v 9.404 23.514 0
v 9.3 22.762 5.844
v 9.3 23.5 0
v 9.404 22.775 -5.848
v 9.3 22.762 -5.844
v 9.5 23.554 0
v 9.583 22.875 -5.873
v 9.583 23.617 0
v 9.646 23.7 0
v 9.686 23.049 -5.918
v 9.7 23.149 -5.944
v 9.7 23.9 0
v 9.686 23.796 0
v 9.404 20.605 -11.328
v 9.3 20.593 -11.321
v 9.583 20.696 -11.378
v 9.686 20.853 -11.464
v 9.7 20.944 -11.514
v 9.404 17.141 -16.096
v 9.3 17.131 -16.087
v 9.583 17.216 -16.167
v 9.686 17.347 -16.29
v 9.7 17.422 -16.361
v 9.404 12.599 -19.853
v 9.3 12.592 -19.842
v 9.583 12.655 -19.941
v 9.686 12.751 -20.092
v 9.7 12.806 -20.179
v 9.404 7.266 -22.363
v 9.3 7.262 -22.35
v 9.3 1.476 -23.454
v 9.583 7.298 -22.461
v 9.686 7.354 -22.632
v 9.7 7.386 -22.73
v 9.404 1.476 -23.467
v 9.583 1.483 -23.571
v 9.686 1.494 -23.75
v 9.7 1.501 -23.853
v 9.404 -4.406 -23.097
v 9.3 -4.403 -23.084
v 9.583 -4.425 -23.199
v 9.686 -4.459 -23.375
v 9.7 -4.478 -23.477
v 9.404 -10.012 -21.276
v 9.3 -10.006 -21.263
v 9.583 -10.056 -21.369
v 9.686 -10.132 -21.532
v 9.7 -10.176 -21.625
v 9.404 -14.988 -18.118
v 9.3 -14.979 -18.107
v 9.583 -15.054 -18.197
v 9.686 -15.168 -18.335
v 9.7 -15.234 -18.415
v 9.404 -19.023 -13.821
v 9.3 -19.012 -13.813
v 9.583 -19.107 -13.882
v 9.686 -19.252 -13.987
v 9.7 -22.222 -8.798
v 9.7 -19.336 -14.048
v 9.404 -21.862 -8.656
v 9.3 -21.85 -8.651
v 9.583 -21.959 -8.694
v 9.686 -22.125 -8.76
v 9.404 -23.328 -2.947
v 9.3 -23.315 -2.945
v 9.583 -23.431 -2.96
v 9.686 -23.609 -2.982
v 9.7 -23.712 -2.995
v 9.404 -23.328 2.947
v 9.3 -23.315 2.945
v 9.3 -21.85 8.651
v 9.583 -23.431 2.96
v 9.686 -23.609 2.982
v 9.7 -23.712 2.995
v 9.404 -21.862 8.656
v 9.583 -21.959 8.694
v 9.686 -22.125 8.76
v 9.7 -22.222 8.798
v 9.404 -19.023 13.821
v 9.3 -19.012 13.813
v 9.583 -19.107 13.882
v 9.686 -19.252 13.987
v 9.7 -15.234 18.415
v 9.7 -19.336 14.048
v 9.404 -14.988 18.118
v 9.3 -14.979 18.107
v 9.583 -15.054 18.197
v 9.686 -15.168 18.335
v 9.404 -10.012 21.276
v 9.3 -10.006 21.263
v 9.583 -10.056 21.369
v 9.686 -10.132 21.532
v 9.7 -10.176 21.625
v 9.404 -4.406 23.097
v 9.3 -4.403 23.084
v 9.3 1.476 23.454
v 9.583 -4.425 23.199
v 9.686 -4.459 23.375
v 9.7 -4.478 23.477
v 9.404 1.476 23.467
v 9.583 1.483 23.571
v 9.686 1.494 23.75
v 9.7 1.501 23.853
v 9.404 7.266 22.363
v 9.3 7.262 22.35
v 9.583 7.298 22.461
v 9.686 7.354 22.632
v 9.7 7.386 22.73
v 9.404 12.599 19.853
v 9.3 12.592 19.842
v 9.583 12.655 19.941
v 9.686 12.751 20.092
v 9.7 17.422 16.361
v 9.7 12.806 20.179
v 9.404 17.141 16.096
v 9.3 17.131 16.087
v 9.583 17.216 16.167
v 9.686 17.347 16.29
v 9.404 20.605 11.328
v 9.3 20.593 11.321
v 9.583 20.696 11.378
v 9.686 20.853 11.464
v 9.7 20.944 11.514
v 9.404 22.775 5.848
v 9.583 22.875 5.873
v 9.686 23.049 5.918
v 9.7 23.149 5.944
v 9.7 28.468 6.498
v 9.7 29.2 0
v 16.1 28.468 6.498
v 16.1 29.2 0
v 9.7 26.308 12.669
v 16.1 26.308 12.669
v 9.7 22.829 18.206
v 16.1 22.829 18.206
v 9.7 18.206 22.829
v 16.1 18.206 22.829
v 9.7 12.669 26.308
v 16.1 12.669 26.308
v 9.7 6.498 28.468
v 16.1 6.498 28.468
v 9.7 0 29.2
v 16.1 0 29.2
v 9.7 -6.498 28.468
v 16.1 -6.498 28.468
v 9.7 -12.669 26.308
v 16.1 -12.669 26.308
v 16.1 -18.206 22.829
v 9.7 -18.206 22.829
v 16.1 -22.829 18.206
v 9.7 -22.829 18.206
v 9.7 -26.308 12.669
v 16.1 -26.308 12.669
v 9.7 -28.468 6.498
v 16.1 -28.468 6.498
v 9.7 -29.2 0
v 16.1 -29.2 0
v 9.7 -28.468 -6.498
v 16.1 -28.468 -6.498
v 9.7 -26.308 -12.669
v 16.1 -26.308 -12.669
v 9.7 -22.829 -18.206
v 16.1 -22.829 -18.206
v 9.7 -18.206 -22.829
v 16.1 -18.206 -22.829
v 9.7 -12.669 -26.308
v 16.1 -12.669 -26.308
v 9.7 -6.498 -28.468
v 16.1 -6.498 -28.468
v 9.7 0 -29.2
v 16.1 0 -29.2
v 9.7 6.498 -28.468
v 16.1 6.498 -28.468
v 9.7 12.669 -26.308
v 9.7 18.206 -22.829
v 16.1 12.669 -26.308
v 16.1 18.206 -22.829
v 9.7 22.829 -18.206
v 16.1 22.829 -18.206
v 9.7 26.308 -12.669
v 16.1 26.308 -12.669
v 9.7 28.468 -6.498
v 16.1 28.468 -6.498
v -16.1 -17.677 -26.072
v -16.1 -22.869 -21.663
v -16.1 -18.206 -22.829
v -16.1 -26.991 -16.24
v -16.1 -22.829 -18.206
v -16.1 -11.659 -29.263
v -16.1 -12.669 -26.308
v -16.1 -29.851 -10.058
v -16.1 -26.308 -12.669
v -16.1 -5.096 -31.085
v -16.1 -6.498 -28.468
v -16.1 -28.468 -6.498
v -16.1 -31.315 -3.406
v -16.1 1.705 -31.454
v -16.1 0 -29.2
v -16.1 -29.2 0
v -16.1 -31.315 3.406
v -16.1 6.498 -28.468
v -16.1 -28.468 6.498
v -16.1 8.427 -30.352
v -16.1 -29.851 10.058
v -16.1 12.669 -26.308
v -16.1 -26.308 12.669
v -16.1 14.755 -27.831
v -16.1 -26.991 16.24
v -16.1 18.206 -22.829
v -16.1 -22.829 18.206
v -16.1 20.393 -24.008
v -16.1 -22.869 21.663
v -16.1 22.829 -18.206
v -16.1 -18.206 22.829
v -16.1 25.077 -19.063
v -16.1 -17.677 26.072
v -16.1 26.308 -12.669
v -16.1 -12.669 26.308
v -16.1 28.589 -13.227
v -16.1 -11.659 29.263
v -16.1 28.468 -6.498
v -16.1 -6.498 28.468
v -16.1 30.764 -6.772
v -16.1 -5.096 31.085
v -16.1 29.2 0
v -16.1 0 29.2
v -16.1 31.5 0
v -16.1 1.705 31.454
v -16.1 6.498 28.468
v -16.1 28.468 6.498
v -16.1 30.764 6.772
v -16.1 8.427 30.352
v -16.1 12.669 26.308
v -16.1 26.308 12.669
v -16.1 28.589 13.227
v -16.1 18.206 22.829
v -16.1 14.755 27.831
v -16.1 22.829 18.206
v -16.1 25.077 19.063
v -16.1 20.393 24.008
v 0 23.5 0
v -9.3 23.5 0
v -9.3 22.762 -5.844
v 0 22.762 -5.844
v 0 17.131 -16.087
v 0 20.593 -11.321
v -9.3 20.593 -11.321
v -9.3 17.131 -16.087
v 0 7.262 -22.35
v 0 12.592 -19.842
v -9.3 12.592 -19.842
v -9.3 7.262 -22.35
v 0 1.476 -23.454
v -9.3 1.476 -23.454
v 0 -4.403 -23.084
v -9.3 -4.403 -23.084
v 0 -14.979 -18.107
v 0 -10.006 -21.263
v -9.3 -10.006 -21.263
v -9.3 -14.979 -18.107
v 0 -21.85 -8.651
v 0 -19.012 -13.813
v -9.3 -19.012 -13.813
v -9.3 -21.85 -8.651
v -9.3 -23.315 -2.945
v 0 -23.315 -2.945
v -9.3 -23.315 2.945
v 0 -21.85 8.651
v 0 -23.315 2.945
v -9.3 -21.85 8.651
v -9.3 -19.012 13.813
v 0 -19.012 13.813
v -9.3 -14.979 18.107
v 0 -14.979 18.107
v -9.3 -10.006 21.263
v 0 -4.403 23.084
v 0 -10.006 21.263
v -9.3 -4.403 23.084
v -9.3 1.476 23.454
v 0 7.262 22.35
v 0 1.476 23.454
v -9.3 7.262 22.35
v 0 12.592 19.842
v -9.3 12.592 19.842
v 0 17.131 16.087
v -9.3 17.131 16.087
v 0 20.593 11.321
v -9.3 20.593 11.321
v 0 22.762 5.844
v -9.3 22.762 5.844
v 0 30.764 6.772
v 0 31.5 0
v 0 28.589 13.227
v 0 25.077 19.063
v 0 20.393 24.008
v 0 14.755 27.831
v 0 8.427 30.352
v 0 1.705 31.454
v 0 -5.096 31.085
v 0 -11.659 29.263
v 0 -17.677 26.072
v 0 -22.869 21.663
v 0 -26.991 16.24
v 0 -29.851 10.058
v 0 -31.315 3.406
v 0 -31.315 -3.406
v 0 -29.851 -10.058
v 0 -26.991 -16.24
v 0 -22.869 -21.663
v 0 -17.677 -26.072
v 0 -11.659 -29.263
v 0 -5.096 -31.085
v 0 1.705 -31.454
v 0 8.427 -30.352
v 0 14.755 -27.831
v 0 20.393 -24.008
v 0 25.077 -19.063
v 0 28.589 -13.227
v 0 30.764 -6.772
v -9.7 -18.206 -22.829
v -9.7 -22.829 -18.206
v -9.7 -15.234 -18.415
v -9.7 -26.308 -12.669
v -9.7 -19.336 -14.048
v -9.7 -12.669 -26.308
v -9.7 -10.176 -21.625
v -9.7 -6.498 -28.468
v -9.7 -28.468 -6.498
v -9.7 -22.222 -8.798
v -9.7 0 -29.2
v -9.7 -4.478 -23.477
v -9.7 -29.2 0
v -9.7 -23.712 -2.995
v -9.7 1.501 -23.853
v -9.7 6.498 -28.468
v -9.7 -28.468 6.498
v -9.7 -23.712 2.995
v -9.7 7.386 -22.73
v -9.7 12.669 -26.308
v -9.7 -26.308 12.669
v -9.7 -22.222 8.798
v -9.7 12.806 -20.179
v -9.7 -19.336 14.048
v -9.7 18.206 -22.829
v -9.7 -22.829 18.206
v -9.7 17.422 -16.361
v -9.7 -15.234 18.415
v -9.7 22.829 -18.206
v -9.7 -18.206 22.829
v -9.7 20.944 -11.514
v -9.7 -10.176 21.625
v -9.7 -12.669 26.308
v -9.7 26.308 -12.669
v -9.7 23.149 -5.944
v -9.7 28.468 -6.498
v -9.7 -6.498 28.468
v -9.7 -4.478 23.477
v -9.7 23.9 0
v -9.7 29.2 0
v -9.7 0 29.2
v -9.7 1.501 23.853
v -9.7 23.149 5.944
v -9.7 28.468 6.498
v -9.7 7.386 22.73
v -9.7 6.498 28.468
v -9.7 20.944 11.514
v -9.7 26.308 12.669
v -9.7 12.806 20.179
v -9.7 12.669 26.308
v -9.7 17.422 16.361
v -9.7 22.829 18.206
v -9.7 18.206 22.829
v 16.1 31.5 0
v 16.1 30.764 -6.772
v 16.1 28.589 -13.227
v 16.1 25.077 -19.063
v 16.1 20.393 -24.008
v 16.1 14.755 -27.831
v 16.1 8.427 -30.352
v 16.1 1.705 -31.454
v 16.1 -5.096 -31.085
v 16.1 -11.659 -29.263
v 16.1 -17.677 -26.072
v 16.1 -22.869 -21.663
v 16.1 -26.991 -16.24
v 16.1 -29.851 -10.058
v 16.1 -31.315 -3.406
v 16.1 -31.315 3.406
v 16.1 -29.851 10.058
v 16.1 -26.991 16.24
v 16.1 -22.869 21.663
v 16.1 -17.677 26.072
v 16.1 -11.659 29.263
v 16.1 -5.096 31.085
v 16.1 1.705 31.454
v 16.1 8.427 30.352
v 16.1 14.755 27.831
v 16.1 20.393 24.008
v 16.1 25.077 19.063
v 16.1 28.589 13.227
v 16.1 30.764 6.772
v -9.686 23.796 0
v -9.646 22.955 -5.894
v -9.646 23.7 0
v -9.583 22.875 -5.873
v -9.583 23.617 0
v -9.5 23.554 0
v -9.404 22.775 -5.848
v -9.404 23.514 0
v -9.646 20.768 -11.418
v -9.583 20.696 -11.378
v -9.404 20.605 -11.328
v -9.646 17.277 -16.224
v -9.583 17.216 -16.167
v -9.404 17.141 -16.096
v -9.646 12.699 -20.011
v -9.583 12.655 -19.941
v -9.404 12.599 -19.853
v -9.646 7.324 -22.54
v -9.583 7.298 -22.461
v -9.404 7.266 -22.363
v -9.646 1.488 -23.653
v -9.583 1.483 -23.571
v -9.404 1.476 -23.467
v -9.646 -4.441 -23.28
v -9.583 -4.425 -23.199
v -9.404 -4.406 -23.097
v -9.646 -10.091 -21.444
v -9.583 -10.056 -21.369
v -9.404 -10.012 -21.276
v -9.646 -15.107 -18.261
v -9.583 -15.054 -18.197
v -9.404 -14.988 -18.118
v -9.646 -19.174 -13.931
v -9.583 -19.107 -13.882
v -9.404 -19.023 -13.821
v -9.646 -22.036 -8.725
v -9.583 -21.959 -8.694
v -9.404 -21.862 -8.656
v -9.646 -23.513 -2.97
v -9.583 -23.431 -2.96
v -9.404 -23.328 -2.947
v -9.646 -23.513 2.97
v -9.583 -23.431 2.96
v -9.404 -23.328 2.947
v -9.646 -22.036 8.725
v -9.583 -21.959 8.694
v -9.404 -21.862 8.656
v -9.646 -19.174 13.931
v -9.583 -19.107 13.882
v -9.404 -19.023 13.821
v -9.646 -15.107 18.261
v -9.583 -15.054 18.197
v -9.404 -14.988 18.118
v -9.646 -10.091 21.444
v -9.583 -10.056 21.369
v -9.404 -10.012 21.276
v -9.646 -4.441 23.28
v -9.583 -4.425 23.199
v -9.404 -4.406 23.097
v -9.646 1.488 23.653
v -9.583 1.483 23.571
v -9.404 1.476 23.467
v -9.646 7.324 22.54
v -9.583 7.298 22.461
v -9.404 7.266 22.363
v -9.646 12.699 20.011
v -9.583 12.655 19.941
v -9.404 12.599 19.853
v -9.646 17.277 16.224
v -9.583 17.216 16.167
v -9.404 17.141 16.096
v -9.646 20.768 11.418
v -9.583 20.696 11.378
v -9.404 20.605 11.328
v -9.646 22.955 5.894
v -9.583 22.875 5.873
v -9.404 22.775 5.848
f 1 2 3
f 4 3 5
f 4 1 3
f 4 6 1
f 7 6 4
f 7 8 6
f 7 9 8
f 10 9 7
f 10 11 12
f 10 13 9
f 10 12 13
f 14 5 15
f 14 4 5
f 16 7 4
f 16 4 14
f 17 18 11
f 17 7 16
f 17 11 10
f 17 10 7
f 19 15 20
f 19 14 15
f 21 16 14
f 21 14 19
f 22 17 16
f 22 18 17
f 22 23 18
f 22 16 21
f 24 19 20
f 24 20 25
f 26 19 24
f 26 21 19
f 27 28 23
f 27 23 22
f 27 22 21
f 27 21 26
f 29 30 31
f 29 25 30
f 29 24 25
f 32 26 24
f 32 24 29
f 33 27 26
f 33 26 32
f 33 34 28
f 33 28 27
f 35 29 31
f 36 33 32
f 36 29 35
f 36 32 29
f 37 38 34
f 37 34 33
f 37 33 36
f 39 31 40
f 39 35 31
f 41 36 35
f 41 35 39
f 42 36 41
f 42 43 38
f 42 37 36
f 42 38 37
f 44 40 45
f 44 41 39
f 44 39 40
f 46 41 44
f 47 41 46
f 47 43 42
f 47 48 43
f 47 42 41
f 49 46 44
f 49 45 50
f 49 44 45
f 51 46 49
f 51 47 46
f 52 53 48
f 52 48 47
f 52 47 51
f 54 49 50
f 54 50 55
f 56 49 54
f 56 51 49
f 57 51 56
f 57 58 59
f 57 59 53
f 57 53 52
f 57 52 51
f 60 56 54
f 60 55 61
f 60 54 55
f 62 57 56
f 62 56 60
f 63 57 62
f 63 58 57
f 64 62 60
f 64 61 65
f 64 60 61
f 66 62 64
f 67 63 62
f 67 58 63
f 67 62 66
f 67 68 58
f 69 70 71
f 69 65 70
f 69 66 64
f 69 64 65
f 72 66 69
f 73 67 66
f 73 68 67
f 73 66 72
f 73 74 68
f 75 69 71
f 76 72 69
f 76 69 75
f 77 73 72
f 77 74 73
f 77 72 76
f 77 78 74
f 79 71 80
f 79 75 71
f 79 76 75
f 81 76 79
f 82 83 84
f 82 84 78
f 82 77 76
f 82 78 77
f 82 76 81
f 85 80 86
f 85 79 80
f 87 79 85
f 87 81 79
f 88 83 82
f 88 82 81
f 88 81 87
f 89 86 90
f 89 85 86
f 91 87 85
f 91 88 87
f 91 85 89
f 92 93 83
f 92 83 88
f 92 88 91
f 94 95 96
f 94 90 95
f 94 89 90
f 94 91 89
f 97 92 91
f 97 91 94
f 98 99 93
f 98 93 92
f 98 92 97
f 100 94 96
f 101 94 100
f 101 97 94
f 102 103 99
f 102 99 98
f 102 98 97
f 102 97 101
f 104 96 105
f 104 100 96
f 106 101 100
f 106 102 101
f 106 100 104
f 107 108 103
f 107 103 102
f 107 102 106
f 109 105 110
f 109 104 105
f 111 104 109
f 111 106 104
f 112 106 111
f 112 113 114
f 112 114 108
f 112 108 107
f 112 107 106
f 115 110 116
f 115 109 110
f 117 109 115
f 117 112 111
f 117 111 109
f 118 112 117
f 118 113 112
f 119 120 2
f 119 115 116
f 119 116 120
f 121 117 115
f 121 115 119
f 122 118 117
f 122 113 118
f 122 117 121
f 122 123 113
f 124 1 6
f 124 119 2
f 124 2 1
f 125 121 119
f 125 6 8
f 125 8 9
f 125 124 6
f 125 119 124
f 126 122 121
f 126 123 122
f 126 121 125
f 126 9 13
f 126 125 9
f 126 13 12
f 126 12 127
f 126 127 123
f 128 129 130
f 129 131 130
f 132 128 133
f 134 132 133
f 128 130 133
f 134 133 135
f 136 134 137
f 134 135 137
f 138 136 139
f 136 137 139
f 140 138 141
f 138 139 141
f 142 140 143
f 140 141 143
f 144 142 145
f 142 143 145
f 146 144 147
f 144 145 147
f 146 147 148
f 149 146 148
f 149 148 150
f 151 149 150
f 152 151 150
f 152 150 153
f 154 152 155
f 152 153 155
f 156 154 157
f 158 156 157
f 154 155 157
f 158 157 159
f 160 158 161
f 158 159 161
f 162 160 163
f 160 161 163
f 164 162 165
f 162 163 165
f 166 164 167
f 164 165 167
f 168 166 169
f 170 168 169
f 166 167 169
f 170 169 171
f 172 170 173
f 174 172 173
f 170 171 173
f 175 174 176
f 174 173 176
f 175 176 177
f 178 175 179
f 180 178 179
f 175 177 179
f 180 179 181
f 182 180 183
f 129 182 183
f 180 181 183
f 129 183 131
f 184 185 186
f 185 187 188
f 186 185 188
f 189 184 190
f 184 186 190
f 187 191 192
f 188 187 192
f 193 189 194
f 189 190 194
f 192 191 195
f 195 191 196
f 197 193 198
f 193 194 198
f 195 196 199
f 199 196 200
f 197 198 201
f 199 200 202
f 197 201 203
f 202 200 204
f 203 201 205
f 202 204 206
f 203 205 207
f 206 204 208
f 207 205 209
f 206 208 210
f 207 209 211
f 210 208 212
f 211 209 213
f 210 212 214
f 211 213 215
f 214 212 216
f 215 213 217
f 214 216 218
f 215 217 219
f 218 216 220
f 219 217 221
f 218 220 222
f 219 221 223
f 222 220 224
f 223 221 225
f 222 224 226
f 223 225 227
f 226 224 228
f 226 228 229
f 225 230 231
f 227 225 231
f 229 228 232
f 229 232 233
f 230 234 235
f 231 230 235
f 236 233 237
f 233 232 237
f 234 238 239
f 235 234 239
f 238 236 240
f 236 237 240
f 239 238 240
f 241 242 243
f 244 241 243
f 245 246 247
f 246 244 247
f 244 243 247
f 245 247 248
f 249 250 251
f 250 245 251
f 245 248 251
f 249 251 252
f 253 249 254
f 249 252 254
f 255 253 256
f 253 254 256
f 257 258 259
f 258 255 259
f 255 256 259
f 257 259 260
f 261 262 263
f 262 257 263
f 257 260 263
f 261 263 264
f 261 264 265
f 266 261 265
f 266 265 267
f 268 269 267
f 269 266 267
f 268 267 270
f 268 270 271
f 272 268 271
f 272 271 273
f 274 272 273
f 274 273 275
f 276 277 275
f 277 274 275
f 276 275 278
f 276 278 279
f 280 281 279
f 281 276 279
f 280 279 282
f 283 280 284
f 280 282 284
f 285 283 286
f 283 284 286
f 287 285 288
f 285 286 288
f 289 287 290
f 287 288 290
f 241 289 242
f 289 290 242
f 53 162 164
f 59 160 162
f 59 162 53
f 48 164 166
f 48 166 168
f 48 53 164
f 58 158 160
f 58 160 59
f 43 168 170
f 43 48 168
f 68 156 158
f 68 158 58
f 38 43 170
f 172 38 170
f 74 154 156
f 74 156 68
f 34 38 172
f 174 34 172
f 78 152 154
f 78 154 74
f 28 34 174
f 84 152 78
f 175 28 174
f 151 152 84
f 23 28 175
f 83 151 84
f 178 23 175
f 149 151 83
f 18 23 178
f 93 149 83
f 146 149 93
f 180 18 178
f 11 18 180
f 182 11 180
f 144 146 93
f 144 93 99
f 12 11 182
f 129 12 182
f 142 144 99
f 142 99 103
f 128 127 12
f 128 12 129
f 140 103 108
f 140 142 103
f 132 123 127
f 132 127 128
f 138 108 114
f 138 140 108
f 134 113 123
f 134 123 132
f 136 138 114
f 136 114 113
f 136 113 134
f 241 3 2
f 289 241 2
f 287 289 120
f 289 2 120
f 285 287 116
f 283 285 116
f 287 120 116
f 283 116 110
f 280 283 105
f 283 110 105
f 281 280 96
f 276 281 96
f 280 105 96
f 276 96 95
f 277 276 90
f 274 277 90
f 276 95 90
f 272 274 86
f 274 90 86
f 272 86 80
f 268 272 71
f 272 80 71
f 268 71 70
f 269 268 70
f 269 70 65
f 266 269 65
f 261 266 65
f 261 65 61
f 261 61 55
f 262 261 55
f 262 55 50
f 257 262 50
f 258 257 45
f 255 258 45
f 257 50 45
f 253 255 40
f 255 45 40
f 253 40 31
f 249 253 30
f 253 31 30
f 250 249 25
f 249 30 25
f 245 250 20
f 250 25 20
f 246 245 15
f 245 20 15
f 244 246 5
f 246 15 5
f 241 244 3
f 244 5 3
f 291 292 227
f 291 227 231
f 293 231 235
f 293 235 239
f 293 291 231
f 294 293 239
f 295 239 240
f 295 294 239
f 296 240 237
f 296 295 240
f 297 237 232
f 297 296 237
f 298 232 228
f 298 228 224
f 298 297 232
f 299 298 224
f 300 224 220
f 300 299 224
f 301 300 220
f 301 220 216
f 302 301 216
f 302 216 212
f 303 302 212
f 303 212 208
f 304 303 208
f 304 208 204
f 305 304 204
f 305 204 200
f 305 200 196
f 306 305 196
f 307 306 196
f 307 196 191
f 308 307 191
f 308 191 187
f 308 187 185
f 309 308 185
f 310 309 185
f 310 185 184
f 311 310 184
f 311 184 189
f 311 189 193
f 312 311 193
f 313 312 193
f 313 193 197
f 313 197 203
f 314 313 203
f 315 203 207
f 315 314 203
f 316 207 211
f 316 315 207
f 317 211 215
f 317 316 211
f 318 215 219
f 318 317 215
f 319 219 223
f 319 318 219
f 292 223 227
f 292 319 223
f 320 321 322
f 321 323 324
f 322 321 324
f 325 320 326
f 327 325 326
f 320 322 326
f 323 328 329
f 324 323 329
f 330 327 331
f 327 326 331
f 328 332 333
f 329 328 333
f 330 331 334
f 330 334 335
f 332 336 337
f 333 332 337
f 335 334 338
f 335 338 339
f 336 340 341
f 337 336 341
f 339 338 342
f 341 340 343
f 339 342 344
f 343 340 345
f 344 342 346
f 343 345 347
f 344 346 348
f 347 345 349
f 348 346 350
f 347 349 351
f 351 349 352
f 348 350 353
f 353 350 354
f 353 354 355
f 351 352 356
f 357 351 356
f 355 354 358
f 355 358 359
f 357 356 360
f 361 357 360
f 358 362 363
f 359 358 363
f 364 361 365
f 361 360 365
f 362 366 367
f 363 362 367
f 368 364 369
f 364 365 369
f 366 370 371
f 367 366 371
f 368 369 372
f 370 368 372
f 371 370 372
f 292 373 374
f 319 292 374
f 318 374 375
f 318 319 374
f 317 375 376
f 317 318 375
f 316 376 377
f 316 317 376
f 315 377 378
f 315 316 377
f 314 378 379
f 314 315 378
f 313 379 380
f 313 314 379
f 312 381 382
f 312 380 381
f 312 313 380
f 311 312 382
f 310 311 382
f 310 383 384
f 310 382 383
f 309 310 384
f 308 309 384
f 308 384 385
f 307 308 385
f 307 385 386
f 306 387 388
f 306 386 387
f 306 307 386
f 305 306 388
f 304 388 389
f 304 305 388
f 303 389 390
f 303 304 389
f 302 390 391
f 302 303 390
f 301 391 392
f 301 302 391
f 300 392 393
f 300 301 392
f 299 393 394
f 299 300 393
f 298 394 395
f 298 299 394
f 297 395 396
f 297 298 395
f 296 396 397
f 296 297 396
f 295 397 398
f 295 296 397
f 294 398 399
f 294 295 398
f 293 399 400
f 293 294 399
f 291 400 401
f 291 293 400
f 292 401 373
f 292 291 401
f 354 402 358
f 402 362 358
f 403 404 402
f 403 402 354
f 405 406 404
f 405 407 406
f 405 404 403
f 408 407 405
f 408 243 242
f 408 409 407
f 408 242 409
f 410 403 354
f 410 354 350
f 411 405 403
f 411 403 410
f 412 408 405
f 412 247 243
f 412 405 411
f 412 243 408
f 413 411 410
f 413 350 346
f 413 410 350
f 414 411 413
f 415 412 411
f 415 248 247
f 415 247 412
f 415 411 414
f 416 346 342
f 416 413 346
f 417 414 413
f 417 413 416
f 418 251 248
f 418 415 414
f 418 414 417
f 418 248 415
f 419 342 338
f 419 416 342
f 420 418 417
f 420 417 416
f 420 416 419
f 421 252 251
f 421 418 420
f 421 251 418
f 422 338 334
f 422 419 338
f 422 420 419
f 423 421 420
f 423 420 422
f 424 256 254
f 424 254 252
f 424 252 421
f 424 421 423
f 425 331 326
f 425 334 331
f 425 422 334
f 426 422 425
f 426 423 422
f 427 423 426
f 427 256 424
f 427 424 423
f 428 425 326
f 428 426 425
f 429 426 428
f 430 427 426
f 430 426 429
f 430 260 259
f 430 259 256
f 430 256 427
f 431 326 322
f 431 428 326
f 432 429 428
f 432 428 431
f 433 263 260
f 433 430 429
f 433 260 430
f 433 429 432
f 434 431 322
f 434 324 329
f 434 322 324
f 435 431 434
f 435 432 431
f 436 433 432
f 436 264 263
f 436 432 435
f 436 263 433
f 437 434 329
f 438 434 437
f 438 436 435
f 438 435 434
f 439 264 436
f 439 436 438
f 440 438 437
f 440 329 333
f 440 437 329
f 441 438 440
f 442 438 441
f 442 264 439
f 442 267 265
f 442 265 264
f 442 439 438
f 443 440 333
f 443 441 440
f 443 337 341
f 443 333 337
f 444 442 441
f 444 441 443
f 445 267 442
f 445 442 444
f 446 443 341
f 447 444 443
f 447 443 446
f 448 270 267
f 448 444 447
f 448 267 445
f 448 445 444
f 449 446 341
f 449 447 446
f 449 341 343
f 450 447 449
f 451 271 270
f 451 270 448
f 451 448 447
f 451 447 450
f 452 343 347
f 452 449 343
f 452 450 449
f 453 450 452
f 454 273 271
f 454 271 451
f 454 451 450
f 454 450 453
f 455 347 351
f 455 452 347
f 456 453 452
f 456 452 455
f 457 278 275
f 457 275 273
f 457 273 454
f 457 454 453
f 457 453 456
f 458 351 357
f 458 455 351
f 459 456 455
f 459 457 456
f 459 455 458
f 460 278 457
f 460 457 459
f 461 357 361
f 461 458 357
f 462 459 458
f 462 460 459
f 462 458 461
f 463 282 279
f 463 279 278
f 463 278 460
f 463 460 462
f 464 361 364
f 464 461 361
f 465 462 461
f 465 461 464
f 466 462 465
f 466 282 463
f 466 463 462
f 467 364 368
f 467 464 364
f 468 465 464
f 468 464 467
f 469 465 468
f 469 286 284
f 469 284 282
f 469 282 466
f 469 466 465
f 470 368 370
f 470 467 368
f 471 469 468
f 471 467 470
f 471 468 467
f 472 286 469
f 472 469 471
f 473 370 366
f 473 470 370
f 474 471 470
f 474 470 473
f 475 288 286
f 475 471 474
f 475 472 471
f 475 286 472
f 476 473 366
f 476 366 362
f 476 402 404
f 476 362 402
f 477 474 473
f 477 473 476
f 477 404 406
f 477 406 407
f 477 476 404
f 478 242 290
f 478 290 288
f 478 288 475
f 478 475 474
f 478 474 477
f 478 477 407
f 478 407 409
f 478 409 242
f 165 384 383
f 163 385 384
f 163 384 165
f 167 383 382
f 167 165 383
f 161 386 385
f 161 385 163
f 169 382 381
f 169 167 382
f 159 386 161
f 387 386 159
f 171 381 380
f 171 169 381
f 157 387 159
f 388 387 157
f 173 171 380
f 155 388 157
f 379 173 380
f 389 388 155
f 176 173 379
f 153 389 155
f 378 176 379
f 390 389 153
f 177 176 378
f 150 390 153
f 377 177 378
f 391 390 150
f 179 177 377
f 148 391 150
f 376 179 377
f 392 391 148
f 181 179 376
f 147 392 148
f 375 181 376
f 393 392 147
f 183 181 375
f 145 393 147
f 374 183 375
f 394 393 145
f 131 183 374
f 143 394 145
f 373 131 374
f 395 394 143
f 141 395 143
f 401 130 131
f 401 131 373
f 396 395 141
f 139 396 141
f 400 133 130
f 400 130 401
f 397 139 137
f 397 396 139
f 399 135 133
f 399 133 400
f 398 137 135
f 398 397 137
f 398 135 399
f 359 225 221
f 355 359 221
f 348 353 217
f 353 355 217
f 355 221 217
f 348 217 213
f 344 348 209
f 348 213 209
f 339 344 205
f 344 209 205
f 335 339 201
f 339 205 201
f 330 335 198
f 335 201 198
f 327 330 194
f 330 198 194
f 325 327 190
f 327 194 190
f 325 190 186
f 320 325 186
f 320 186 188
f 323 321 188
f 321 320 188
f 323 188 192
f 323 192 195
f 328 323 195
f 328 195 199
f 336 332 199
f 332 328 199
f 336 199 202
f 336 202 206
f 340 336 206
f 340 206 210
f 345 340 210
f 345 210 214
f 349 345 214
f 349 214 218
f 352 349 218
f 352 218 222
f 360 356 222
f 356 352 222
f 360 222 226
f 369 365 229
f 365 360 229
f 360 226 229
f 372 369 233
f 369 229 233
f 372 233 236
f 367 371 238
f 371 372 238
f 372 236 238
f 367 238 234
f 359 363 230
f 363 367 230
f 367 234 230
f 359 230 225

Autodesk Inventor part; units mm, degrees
ref_plane "YZ Plane" through (0, 0, 0) normal (1, 0, 0) x (0, 1, 0)
ref_plane "XZ Plane" through (0, 0, 0) normal (0, 1, 0) x (-1, 0, 0)
ref_plane "XY Plane" through (0, 0, 0) normal (0, 0, 1) x (1, 0, 0)
sketch "Sketch1" plane through (0, 0, 0) normal (0, 0, 1) x (1, 0, 0)
  line L0 (0, 23.5) -> (9.3, 23.5)
  line L1 (9.7, 23.9) -> (9.7, 29.2)
  line L2 (9.7, 29.2) -> (16.1, 29.2)
  line L3 (16.1, 29.2) -> (16.1, 31.5)
  line L4 (16.1, 31.5) -> (0, 31.5)
  line L5 (0, 23.5) -> (0, 39.7331)
  arc A0 (9.3, 23.5) -> (9.7, 23.9) centre (9.3, 23.9) ccw
  line L6 (0, 0) -> (48.7382, 0)
  line L7 (0, 23.5) -> (-9.3, 23.5)
  line L8 (-9.7, 23.9) -> (-9.7, 29.2)
  line L9 (-9.7, 29.2) -> (-16.1, 29.2)
  line L10 (-16.1, 29.2) -> (-16.1, 31.5)
  line L11 (-16.1, 31.5) -> (0, 31.5)
  arc A1 (-9.7, 23.9) -> (-9.3, 23.5) centre (-9.3, 23.9) ccw
  dimension "d0" = 0.4
  dimension "d1" = 47
  dimension "d2" = 63
  dimension "d3" = 58.4
  dimension "d4" = 16.1
  dimension "d5" = 9.7
revolve "Revolution1" add sketch "Sketch1" angle 360 about axis through (0, 0, 0) along (1, 0, 0)
properties part number "3136 7009 52" material "Nylon 6/6"
